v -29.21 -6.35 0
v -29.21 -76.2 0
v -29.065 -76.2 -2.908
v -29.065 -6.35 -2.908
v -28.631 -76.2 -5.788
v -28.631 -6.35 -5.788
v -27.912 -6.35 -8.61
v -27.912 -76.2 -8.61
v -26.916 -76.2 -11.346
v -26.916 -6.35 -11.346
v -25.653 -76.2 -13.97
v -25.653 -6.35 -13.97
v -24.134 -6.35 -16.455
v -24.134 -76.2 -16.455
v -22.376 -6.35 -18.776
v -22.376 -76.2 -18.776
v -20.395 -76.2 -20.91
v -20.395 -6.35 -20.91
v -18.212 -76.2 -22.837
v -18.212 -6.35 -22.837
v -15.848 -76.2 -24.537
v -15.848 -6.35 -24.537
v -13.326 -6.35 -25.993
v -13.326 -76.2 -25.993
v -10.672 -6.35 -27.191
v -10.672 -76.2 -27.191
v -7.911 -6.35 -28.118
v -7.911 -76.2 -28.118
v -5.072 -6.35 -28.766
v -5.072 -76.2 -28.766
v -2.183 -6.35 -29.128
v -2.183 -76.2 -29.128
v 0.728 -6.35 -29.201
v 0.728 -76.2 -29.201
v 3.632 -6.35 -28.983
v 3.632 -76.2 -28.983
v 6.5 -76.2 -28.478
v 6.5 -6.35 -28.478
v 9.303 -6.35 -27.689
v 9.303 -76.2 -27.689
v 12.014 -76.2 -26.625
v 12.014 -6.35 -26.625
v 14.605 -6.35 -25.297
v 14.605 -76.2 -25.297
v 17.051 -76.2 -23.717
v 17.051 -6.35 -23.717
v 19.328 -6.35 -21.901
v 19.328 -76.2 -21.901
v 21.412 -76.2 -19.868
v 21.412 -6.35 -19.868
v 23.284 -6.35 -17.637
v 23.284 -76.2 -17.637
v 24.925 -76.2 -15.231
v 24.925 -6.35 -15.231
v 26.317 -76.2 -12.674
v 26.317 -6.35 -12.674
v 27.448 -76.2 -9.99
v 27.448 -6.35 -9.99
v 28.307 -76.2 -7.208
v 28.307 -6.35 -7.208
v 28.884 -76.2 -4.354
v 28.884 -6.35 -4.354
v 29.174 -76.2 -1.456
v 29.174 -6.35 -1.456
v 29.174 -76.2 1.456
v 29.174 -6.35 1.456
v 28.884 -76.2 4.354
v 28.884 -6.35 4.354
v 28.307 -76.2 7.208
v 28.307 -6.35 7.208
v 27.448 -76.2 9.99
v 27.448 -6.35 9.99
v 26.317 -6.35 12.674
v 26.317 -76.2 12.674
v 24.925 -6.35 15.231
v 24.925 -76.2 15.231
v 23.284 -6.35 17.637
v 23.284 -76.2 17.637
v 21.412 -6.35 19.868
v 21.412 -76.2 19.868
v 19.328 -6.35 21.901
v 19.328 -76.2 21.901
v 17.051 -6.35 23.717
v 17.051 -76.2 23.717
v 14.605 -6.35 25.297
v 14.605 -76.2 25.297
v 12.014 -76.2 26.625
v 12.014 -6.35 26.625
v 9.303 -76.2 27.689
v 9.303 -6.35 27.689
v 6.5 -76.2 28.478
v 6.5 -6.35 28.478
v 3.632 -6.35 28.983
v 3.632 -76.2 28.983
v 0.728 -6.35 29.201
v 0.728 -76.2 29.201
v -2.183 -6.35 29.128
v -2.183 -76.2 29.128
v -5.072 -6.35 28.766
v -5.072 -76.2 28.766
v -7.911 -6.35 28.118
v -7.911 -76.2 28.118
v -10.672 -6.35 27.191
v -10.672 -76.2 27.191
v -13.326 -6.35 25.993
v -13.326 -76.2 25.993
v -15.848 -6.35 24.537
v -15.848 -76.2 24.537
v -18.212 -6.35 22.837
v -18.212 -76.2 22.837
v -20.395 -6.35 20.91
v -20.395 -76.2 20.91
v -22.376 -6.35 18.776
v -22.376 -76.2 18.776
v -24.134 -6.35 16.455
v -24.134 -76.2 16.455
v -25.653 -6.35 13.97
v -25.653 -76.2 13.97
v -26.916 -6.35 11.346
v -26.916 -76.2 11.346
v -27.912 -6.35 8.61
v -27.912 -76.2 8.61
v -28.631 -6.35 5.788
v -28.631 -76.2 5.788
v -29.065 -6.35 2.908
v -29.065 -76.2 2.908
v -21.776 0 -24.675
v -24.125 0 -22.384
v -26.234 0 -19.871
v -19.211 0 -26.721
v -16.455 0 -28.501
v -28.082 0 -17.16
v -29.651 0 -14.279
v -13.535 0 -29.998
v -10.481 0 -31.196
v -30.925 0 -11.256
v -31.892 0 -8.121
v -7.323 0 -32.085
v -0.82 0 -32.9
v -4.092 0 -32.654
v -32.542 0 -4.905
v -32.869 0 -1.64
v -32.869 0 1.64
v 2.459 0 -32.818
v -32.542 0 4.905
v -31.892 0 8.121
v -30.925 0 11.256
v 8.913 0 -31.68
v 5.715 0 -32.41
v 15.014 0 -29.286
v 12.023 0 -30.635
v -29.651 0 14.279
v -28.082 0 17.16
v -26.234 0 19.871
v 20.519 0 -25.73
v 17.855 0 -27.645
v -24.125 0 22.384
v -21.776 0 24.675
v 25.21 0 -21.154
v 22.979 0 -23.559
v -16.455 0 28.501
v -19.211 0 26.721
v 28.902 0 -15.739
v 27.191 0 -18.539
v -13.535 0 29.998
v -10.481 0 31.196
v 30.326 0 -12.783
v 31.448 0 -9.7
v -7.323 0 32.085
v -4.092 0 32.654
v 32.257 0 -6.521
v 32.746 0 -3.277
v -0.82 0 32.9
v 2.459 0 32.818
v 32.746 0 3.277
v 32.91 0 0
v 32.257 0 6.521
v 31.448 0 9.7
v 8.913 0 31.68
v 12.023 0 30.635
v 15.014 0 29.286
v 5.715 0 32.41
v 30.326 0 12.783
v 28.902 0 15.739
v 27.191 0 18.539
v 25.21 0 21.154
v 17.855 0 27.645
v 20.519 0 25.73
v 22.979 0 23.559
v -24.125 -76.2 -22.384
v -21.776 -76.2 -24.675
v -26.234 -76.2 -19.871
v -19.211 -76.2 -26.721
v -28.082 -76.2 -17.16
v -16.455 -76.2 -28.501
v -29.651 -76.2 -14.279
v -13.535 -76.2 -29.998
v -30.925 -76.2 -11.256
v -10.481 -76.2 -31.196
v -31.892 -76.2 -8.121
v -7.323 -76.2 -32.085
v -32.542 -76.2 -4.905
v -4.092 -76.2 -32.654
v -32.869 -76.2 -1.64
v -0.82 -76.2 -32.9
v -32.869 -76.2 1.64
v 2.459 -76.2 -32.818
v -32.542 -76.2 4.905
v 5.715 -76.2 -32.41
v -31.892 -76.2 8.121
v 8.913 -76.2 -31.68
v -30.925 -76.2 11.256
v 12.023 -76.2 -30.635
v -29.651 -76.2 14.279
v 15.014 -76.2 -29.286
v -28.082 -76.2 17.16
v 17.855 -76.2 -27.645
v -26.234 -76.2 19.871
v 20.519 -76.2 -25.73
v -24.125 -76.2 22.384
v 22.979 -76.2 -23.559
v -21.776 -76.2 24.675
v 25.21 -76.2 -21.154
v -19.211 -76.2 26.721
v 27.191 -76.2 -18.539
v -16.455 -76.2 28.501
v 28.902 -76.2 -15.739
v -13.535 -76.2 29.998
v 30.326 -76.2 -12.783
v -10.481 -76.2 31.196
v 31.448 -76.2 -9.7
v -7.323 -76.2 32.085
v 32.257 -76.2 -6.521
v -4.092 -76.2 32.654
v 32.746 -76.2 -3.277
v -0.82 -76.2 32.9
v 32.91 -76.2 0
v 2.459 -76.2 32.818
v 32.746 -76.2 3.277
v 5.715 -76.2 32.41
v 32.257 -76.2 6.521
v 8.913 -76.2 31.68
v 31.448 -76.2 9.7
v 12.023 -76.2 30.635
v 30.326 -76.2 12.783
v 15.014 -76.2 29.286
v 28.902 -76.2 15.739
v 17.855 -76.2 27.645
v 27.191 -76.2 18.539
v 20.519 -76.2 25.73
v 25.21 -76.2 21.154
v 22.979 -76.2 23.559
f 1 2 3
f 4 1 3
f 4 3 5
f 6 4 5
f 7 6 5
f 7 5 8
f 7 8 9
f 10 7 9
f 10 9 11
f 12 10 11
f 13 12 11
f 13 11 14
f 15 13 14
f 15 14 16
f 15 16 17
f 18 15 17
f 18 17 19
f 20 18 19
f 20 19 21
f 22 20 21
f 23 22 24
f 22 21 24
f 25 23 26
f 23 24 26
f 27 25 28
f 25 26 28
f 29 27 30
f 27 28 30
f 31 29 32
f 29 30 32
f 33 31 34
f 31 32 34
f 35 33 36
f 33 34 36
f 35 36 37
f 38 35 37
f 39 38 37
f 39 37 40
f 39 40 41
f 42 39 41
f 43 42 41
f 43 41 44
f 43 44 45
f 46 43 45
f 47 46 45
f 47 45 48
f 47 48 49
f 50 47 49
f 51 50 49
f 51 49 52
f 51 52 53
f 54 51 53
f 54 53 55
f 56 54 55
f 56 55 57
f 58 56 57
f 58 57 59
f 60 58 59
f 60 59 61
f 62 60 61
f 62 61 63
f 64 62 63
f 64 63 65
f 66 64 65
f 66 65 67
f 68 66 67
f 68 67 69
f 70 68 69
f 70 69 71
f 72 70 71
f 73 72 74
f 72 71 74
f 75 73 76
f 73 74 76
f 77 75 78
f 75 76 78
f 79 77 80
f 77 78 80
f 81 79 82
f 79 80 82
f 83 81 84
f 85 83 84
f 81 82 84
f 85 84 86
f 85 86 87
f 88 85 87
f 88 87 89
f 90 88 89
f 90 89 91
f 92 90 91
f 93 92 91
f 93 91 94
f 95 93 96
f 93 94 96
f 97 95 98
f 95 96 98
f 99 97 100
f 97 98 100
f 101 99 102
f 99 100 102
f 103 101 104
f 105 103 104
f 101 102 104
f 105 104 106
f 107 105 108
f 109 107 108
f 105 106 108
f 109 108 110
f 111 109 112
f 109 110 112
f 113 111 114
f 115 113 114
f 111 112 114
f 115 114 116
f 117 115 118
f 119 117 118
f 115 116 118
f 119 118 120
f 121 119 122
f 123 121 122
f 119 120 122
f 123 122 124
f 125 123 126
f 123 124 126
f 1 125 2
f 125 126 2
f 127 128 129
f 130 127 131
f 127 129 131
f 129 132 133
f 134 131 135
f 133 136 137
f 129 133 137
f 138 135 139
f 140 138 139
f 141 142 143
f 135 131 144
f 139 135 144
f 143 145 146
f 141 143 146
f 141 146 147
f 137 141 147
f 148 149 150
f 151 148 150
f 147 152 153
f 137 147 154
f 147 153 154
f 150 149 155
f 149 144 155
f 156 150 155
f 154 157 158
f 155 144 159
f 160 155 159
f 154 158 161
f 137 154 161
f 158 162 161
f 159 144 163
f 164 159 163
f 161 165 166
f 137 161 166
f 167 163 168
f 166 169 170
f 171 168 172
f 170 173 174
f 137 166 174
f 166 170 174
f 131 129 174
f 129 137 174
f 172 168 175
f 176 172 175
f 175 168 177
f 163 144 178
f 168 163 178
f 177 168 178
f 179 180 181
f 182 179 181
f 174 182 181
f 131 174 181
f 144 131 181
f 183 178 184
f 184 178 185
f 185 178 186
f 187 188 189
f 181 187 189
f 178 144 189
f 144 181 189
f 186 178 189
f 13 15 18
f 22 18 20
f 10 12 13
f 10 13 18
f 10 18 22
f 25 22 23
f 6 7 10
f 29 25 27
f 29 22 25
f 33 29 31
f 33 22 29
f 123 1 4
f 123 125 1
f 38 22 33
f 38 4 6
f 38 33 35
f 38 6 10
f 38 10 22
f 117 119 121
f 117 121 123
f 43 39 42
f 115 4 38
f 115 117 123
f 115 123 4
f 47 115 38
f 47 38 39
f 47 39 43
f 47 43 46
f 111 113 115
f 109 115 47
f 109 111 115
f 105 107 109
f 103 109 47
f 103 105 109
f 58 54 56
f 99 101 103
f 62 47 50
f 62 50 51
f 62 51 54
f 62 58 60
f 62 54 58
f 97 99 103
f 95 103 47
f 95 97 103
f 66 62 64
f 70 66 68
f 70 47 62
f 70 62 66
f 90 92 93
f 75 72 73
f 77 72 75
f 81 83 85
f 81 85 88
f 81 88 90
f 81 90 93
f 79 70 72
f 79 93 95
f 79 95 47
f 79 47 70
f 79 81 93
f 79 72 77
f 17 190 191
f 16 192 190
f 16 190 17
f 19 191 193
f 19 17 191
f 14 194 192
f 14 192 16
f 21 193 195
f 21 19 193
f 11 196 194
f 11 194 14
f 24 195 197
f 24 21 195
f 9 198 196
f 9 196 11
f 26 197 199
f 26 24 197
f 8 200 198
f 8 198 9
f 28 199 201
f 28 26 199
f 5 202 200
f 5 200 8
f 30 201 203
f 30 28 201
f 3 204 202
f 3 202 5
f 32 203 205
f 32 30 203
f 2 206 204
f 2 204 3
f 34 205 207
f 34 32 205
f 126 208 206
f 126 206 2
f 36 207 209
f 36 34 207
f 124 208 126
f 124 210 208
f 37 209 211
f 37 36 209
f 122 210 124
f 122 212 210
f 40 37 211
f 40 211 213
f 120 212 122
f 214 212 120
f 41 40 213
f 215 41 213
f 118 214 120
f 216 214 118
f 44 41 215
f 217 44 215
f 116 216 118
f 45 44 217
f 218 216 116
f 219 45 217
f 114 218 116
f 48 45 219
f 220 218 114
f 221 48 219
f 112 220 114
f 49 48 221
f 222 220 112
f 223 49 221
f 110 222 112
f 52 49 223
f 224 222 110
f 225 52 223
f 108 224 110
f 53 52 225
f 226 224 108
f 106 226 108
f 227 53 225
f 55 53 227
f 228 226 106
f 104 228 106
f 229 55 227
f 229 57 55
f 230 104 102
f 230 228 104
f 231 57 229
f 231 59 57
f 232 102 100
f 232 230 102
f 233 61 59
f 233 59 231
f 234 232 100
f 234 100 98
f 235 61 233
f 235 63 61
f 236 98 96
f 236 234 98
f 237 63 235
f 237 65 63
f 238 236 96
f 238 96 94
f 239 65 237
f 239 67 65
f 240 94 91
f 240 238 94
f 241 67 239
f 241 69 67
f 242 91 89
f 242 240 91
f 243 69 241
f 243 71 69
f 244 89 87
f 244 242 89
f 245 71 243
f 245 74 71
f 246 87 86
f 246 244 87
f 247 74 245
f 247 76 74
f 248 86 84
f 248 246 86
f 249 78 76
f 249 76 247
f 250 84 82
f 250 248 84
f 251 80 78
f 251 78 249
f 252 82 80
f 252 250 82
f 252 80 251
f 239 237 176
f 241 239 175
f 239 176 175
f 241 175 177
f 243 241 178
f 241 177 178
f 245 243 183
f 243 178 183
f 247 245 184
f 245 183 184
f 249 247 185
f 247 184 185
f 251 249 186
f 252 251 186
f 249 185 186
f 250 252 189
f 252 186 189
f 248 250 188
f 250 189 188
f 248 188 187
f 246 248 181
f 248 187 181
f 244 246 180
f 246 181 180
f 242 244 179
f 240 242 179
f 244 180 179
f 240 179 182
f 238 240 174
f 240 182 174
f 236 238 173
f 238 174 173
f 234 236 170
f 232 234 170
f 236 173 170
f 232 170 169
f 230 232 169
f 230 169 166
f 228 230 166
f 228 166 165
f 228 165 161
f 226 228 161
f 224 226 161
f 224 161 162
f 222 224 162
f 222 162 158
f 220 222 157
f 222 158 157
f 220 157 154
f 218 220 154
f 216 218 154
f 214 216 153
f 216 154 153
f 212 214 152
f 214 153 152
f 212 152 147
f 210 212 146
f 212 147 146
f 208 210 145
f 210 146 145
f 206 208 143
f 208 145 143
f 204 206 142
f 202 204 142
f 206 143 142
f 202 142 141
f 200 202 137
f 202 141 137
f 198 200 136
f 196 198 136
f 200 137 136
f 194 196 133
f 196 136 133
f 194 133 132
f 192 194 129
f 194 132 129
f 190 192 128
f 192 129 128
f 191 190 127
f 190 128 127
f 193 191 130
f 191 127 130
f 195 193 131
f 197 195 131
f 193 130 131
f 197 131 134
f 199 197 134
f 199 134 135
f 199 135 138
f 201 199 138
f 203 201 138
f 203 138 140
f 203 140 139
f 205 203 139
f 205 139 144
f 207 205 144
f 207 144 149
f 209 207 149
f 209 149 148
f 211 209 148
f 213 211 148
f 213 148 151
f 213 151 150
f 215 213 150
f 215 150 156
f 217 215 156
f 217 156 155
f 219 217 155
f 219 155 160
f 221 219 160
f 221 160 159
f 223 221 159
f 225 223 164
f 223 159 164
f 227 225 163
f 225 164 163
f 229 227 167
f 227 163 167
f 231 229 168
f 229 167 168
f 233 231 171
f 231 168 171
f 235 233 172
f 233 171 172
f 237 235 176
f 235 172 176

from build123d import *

# Parameters (mm, degrees)
F0_R     = 32.909894
F2_DEPTH = 76.2
F3_D     = 58.42
F4_R     = 30.278142
F5_DEPTH = 6.35


with BuildPart() as f2:
    # F0 (on Front) → F2 (new body)
    with BuildSketch(Plane.XZ):
        Circle(F0_R)
    extrude(amount=F2_DEPTH)

    # F3 (through all)
    with Locations(Plane(origin=(0, 0, 0), x_dir=(1, 0, 0), z_dir=(0, 1, 0))):
        with Locations((0, 0)):
            Hole(F3_D / 2)

    # F4 (on Front) → F5 (join)
    with BuildSketch(Plane.XZ):
        Circle(F4_R)
    extrude(amount=F5_DEPTH)


solid = f2.part
